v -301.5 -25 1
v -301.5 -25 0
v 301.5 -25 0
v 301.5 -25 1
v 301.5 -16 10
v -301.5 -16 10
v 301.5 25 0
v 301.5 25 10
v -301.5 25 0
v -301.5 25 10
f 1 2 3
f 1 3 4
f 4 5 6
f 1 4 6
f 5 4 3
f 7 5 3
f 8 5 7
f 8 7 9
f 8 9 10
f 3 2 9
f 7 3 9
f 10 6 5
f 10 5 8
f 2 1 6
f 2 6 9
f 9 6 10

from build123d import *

# Parameters (mm, degrees)
F0_W     = 50
F0_H     = 10
F1_DEPTH = 301.5
F2_SIZE  = 9


with BuildPart() as f1:
    # F0 (on Right) → F1 (new body, symmetric)
    with BuildSketch(Plane.YZ):
        with Locations((0, 5)):
            Rectangle(F0_W, F0_H)
    extrude(amount=F1_DEPTH, both=True)

    # F2
    f2_edges = [f1.edges().sort_by_distance(p)[0] for p in [
        (0, -25, 10),
    ]]
    chamfer(f2_edges, length=F2_SIZE)


solid = f1.part
